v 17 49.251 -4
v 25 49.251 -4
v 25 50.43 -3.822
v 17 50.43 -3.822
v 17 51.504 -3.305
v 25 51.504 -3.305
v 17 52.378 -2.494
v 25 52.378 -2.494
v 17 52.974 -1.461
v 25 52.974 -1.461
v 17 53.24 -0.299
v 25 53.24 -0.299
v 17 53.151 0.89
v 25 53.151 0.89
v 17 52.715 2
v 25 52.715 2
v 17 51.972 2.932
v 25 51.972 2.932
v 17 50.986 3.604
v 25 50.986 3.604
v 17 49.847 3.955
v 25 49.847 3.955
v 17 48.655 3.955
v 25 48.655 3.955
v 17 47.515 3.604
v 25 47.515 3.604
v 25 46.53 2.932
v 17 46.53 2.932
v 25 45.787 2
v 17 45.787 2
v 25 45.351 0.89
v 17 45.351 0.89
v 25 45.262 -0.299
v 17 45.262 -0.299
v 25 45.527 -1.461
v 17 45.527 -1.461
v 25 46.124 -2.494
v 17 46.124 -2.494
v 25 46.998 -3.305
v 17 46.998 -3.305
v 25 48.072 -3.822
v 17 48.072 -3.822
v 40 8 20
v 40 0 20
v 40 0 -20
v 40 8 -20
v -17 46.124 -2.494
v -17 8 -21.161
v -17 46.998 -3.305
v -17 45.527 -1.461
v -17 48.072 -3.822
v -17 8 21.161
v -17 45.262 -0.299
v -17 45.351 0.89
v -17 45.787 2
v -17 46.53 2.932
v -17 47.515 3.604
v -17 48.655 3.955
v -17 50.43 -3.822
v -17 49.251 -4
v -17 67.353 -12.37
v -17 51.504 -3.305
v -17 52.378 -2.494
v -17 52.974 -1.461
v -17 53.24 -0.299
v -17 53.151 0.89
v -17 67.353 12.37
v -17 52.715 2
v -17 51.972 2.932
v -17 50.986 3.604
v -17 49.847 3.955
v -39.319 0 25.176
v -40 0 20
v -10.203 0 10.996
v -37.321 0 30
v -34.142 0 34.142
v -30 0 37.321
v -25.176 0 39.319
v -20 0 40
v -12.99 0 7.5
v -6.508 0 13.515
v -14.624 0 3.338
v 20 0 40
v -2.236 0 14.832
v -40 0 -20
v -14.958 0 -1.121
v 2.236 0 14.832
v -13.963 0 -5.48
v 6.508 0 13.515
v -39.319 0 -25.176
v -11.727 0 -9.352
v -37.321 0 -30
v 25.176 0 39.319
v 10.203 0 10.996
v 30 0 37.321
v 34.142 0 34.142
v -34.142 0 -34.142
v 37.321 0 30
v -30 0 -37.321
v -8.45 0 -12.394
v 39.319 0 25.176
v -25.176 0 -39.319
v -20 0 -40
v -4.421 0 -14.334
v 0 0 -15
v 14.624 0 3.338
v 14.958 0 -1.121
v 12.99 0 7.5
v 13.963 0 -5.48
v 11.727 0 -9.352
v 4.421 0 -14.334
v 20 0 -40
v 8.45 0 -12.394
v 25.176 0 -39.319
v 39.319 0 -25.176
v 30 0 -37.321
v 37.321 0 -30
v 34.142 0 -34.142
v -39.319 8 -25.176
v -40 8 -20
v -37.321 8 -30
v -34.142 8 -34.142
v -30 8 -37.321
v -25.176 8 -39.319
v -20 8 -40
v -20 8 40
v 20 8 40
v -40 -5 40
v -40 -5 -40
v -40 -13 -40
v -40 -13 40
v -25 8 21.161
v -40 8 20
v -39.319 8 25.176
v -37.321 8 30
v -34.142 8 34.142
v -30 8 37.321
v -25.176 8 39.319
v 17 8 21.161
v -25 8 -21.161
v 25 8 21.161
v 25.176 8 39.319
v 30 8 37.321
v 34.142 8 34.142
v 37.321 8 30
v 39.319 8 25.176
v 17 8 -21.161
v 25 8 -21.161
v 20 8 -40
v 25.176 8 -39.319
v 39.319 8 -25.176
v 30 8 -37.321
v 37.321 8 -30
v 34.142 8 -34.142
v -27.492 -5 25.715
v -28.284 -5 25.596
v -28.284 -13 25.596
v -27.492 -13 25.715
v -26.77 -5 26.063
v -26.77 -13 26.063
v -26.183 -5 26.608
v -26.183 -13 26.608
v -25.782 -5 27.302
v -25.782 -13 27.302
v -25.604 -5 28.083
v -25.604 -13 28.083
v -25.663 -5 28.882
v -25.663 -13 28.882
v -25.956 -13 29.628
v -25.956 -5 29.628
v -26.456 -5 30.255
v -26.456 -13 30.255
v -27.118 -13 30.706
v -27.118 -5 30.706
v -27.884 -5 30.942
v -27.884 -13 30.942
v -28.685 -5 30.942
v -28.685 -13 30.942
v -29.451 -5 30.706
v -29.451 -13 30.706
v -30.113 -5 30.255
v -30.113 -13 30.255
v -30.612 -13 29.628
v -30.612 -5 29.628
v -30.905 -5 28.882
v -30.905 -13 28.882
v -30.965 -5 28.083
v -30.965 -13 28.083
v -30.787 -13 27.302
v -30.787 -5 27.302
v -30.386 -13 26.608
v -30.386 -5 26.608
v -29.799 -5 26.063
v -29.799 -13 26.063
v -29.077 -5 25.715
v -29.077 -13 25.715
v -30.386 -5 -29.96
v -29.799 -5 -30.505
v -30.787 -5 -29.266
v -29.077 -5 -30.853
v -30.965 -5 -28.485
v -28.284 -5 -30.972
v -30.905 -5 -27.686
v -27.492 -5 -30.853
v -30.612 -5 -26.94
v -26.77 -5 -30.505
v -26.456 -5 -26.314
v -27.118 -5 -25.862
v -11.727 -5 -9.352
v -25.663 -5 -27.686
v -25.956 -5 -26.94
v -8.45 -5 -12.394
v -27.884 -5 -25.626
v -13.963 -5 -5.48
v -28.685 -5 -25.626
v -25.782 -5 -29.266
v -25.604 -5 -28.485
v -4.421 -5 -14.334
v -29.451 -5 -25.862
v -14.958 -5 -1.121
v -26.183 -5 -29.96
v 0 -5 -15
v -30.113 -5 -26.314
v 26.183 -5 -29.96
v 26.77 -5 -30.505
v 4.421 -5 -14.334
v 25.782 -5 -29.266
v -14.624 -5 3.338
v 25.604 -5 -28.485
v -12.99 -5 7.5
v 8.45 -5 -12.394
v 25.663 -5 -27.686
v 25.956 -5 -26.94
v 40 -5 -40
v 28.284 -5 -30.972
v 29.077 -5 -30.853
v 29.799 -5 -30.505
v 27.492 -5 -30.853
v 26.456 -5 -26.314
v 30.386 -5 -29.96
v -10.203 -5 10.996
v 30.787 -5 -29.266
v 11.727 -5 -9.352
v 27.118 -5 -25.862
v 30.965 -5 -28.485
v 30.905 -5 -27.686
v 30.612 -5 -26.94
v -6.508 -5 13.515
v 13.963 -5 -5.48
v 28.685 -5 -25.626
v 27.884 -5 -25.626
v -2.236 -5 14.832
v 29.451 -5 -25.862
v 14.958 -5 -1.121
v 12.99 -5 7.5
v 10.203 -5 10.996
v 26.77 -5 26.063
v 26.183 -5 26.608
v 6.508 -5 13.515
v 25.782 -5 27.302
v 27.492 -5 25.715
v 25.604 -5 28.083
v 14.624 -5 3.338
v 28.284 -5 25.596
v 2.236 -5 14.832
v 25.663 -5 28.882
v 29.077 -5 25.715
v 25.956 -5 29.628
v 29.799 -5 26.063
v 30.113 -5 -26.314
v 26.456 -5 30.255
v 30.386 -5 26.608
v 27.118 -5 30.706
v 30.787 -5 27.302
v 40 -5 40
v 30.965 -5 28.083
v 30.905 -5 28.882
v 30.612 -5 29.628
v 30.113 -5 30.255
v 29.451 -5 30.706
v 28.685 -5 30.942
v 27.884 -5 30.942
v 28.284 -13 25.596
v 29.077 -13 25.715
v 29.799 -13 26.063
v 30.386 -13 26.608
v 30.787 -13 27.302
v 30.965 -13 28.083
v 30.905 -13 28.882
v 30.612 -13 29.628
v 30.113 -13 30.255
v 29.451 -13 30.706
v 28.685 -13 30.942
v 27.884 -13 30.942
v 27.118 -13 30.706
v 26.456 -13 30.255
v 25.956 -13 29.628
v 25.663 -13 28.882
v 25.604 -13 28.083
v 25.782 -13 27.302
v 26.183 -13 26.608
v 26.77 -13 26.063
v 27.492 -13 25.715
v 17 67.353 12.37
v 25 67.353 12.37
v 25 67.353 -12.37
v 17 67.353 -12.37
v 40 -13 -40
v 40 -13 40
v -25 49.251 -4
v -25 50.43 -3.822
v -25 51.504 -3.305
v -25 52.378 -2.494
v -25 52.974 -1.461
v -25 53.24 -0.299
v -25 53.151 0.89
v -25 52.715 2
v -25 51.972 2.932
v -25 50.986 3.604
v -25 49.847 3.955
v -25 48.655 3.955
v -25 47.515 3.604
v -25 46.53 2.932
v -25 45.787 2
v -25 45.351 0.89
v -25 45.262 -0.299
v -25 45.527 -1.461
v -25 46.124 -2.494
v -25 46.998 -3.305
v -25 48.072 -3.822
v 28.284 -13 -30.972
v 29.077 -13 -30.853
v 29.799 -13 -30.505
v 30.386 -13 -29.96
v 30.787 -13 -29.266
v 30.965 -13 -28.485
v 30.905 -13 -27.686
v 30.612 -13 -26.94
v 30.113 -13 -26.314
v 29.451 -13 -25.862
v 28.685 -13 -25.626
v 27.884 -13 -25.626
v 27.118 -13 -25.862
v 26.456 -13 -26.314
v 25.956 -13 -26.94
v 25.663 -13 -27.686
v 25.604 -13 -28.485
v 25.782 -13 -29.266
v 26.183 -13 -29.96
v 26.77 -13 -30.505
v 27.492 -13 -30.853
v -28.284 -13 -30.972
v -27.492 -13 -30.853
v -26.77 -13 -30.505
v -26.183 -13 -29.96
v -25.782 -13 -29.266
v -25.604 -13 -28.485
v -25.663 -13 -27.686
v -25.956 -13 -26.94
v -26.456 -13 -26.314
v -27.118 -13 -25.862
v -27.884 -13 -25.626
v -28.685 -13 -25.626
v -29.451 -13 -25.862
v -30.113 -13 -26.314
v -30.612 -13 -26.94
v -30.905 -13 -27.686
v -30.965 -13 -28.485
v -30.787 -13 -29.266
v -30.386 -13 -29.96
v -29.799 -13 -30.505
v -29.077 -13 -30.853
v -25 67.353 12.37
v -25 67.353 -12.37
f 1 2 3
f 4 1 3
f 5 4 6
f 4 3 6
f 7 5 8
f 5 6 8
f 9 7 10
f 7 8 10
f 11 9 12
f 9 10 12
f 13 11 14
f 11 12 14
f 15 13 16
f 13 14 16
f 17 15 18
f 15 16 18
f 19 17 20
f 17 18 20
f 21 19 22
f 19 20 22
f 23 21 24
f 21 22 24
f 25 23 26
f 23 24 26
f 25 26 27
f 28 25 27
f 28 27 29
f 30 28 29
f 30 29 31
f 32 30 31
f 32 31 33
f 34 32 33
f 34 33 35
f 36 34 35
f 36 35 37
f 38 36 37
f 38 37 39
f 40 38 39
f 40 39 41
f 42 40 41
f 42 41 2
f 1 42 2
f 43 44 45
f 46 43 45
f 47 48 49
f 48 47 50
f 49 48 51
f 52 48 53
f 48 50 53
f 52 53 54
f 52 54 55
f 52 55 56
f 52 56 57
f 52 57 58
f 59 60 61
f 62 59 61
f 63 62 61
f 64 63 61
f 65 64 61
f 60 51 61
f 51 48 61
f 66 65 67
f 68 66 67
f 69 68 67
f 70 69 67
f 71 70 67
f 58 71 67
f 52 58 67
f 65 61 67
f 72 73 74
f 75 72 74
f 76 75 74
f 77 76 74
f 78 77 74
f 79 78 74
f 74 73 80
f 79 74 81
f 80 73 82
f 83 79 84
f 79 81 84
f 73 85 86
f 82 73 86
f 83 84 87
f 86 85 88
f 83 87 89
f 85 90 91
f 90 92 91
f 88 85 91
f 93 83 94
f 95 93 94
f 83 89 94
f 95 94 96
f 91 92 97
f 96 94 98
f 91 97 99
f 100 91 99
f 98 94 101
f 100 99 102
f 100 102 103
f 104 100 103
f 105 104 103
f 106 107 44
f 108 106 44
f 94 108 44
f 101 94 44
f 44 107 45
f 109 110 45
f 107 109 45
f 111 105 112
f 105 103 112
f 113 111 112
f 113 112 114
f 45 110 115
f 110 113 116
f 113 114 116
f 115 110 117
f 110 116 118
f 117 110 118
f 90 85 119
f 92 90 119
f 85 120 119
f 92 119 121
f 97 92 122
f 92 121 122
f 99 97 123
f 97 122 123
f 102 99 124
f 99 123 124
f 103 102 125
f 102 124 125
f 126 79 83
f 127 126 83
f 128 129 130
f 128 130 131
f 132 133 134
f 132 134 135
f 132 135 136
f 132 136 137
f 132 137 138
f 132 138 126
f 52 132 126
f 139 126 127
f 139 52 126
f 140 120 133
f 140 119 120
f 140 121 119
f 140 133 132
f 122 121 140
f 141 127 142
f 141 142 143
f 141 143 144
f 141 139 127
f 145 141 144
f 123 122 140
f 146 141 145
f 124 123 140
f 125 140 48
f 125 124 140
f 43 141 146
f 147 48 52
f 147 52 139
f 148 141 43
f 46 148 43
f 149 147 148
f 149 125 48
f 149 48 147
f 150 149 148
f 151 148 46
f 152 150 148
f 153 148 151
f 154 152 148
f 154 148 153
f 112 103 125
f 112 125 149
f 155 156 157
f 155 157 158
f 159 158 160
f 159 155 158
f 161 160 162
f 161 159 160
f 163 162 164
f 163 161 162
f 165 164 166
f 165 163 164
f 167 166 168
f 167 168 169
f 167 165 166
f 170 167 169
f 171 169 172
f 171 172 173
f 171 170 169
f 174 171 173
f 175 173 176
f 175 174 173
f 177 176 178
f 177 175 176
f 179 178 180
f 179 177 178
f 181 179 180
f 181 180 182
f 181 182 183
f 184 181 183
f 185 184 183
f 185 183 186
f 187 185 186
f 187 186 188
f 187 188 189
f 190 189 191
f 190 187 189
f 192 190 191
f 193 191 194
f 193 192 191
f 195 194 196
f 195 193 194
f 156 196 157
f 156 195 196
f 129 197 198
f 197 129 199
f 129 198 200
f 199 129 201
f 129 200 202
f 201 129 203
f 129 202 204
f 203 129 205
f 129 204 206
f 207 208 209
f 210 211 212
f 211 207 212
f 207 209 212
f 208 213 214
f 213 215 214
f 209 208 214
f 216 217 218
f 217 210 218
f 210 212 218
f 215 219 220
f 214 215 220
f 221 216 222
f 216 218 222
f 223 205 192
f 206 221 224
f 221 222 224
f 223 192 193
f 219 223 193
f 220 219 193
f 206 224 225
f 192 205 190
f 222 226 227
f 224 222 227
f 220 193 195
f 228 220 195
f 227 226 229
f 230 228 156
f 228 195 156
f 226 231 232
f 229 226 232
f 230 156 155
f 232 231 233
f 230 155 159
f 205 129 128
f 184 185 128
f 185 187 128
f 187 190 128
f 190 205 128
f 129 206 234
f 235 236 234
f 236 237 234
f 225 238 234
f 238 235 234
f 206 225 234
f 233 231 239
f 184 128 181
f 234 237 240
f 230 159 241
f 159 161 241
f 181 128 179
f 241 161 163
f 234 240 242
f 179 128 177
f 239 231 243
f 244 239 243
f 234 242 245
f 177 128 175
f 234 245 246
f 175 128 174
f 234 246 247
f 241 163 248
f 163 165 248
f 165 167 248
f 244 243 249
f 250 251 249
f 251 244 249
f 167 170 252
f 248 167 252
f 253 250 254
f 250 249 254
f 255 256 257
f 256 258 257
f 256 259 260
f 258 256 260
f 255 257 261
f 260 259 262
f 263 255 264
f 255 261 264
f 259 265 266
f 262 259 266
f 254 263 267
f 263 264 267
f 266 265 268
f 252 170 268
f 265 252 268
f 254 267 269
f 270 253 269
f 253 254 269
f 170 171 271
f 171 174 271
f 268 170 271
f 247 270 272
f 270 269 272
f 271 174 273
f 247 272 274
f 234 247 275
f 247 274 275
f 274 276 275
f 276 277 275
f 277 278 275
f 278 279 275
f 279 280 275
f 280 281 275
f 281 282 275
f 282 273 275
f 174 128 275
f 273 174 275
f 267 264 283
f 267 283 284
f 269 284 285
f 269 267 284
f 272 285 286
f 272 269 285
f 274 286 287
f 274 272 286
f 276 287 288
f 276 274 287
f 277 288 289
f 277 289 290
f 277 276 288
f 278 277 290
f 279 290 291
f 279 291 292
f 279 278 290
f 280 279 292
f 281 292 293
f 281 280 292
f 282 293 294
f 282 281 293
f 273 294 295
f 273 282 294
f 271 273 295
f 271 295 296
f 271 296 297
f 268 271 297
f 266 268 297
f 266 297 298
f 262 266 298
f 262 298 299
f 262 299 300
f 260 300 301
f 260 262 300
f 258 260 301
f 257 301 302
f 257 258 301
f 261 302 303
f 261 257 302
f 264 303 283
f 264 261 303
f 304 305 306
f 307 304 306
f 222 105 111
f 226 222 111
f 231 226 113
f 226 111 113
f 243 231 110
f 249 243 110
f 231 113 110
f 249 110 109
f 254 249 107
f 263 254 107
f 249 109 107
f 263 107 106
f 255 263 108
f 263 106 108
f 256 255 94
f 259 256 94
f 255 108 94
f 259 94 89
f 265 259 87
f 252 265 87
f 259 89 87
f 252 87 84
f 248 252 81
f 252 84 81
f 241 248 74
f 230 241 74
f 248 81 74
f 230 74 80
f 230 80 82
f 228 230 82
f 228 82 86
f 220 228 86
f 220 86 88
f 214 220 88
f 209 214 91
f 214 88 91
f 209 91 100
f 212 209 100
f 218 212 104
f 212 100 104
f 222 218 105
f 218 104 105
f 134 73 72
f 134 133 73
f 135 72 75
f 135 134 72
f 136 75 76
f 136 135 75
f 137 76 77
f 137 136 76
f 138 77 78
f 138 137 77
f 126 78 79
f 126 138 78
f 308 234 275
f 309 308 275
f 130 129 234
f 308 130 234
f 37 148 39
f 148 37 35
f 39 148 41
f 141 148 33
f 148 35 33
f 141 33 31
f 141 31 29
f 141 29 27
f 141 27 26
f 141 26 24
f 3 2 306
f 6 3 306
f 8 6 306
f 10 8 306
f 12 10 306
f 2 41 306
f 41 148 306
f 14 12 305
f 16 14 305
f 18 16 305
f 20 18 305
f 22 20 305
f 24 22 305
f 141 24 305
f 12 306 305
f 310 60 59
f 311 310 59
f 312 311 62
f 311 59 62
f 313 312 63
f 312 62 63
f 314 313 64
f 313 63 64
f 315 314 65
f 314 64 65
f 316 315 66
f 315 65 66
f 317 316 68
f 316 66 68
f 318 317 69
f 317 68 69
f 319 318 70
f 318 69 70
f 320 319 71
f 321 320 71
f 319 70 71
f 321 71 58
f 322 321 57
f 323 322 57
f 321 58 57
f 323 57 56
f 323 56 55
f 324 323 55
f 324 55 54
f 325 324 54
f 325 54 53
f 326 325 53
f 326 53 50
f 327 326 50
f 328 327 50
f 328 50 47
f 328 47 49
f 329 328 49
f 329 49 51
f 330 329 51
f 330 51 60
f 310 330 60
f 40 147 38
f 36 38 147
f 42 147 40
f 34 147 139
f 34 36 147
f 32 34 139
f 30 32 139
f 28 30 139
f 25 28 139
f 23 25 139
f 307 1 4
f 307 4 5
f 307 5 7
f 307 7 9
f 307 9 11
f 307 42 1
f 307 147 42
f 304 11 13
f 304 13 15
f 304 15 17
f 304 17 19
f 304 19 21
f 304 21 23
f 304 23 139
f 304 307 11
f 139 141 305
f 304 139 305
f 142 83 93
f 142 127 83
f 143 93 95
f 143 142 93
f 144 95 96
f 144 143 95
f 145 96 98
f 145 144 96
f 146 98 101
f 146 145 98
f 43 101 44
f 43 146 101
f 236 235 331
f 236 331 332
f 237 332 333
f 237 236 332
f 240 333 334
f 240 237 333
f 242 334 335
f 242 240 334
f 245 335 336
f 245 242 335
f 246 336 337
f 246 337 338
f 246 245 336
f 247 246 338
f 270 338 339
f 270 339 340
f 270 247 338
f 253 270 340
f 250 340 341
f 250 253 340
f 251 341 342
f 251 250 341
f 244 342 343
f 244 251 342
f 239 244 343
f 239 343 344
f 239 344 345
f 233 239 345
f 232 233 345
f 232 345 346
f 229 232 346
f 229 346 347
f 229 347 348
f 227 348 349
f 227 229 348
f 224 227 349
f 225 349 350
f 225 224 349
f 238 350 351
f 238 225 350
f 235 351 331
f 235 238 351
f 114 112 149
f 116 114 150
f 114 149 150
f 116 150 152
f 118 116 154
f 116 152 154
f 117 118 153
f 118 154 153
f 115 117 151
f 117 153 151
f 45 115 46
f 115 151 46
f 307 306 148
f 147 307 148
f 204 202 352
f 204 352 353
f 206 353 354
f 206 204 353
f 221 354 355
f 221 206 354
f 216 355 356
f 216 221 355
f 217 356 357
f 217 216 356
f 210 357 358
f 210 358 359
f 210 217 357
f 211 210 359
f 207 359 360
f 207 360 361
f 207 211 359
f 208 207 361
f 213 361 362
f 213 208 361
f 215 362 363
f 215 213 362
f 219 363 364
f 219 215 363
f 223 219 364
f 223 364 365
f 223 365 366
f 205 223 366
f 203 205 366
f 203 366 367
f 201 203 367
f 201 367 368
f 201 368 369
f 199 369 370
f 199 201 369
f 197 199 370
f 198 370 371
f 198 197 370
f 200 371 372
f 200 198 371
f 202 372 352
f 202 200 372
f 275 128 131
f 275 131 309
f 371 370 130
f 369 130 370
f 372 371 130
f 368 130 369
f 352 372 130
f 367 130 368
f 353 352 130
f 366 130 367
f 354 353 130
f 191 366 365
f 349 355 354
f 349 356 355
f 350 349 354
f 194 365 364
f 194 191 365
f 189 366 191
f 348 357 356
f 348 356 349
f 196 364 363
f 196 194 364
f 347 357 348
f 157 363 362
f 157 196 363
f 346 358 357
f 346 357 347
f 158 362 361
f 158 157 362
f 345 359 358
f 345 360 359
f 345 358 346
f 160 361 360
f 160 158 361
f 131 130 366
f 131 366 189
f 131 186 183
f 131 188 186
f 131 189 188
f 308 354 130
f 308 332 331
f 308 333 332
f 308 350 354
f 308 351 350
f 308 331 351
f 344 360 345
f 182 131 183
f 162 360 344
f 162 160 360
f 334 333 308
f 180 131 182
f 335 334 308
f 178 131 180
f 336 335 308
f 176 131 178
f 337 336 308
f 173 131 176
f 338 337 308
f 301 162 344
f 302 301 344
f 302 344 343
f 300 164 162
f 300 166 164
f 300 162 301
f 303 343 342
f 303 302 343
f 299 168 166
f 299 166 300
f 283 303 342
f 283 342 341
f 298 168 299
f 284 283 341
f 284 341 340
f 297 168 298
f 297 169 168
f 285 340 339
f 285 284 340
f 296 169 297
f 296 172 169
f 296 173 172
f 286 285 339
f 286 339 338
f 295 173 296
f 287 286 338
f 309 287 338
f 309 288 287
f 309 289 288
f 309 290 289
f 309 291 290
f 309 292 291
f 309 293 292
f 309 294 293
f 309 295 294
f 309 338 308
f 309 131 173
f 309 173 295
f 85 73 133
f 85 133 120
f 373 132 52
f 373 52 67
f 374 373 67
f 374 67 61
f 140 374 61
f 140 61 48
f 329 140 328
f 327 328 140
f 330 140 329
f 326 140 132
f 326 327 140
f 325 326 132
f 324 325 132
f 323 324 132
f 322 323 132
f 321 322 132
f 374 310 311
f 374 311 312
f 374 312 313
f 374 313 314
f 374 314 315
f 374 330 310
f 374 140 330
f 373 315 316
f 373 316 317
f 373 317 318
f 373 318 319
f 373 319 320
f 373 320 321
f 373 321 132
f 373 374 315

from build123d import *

# Parameters (mm, degrees)
SKETCH1_W           = 80
SKETCH1_H           = 80
BOSS_EXTRUDE1_DEPTH = 8
BOSS_EXTRUDE2_DEPTH = 8
SKETCH5_R           = 4
CUT_EXTRUDE2_DEPTH  = 85
SKETCH6_R           = 15
BOSS_EXTRUDE3_DEPTH = 5
SKETCH7_W           = 80
SKETCH7_H           = 80
SKETCH7_R           = 2.688208694
BOSS_EXTRUDE4_DEPTH = 8
FILLET1_R           = 20
FILLET2_R           = 20


with BuildPart() as part:
    # Sketch1 → Boss-Extrude1 (new body)
    with BuildSketch(Plane(origin=(0, 0, 0), x_dir=(1, 0, 0), z_dir=(0, 1, 0))):
        Rectangle(SKETCH1_W, SKETCH1_H)
    extrude(amount=BOSS_EXTRUDE1_DEPTH)

    # Sketch4 → Boss-Extrude2 (add)
    with BuildSketch(Plane(origin=(-25, 0, 0), x_dir=(0, 0, -1), z_dir=(1, 0, 0))):
        Polygon((-21.161091888, 8), (-12.370414248, 67.35253985), (12.370414248, 67.35253985), (21.161091888, 8), align=None)
    boss_extrude2 = extrude(amount=BOSS_EXTRUDE2_DEPTH)

    # Mirror1: Boss-Extrude2 across plane
    add(boss_extrude2.mirror(Plane(origin=(0, 0, 0), x_dir=(0, 0, 1), z_dir=(1, 0, 0))))

    # Sketch5 → Cut-Extrude2 (cut)
    with BuildSketch(Plane(origin=(25, 0, 0), x_dir=(0, 0, -1), z_dir=(1, 0, 0))):
        with Locations((0, 49.250906007)):
            Circle(SKETCH5_R)
    extrude(amount=-CUT_EXTRUDE2_DEPTH, mode=Mode.SUBTRACT)

    # Sketch6 → Boss-Extrude3 (add)
    with BuildSketch(Plane.XZ):
        with Locations(Location((0, 0, 0), (0, 0, 270))):
            Circle(SKETCH6_R)
    extrude(amount=BOSS_EXTRUDE3_DEPTH)

    # Sketch7 → Boss-Extrude4 (add)
    with BuildSketch(Plane.XZ.offset(5)):
        Rectangle(SKETCH7_W, SKETCH7_H)
        with Locations(Location((-28.284271247, 28.284271247, 0), (0, 0, 270))):
            Circle(SKETCH7_R, mode=Mode.SUBTRACT)
        with Locations(Location((28.284271247, 28.284271247, 0), (0, 0, 270))):
            Circle(SKETCH7_R, mode=Mode.SUBTRACT)
        with Locations(Location((28.284271247, -28.284271247, 0), (0, 0, 270))):
            Circle(SKETCH7_R, mode=Mode.SUBTRACT)
        with Locations(Location((-28.284271247, -28.284271247, 0), (0, 0, 270))):
            Circle(SKETCH7_R, mode=Mode.SUBTRACT)
    extrude(amount=BOSS_EXTRUDE4_DEPTH)

    # Fillet1
    fillet1_edges = [part.edges().sort_by_distance(p)[0] for p in [
        (-40, 4, -40),
    ]]
    fillet(fillet1_edges, radius=FILLET1_R)

    # Fillet2
    fillet2_edges = [part.edges().sort_by_distance(p)[0] for p in [
        (40, 4, 40),
        (-40, 4, 40),
        (40, 4, -40),
    ]]
    fillet(fillet2_edges, radius=FILLET2_R)


solid = part.part
